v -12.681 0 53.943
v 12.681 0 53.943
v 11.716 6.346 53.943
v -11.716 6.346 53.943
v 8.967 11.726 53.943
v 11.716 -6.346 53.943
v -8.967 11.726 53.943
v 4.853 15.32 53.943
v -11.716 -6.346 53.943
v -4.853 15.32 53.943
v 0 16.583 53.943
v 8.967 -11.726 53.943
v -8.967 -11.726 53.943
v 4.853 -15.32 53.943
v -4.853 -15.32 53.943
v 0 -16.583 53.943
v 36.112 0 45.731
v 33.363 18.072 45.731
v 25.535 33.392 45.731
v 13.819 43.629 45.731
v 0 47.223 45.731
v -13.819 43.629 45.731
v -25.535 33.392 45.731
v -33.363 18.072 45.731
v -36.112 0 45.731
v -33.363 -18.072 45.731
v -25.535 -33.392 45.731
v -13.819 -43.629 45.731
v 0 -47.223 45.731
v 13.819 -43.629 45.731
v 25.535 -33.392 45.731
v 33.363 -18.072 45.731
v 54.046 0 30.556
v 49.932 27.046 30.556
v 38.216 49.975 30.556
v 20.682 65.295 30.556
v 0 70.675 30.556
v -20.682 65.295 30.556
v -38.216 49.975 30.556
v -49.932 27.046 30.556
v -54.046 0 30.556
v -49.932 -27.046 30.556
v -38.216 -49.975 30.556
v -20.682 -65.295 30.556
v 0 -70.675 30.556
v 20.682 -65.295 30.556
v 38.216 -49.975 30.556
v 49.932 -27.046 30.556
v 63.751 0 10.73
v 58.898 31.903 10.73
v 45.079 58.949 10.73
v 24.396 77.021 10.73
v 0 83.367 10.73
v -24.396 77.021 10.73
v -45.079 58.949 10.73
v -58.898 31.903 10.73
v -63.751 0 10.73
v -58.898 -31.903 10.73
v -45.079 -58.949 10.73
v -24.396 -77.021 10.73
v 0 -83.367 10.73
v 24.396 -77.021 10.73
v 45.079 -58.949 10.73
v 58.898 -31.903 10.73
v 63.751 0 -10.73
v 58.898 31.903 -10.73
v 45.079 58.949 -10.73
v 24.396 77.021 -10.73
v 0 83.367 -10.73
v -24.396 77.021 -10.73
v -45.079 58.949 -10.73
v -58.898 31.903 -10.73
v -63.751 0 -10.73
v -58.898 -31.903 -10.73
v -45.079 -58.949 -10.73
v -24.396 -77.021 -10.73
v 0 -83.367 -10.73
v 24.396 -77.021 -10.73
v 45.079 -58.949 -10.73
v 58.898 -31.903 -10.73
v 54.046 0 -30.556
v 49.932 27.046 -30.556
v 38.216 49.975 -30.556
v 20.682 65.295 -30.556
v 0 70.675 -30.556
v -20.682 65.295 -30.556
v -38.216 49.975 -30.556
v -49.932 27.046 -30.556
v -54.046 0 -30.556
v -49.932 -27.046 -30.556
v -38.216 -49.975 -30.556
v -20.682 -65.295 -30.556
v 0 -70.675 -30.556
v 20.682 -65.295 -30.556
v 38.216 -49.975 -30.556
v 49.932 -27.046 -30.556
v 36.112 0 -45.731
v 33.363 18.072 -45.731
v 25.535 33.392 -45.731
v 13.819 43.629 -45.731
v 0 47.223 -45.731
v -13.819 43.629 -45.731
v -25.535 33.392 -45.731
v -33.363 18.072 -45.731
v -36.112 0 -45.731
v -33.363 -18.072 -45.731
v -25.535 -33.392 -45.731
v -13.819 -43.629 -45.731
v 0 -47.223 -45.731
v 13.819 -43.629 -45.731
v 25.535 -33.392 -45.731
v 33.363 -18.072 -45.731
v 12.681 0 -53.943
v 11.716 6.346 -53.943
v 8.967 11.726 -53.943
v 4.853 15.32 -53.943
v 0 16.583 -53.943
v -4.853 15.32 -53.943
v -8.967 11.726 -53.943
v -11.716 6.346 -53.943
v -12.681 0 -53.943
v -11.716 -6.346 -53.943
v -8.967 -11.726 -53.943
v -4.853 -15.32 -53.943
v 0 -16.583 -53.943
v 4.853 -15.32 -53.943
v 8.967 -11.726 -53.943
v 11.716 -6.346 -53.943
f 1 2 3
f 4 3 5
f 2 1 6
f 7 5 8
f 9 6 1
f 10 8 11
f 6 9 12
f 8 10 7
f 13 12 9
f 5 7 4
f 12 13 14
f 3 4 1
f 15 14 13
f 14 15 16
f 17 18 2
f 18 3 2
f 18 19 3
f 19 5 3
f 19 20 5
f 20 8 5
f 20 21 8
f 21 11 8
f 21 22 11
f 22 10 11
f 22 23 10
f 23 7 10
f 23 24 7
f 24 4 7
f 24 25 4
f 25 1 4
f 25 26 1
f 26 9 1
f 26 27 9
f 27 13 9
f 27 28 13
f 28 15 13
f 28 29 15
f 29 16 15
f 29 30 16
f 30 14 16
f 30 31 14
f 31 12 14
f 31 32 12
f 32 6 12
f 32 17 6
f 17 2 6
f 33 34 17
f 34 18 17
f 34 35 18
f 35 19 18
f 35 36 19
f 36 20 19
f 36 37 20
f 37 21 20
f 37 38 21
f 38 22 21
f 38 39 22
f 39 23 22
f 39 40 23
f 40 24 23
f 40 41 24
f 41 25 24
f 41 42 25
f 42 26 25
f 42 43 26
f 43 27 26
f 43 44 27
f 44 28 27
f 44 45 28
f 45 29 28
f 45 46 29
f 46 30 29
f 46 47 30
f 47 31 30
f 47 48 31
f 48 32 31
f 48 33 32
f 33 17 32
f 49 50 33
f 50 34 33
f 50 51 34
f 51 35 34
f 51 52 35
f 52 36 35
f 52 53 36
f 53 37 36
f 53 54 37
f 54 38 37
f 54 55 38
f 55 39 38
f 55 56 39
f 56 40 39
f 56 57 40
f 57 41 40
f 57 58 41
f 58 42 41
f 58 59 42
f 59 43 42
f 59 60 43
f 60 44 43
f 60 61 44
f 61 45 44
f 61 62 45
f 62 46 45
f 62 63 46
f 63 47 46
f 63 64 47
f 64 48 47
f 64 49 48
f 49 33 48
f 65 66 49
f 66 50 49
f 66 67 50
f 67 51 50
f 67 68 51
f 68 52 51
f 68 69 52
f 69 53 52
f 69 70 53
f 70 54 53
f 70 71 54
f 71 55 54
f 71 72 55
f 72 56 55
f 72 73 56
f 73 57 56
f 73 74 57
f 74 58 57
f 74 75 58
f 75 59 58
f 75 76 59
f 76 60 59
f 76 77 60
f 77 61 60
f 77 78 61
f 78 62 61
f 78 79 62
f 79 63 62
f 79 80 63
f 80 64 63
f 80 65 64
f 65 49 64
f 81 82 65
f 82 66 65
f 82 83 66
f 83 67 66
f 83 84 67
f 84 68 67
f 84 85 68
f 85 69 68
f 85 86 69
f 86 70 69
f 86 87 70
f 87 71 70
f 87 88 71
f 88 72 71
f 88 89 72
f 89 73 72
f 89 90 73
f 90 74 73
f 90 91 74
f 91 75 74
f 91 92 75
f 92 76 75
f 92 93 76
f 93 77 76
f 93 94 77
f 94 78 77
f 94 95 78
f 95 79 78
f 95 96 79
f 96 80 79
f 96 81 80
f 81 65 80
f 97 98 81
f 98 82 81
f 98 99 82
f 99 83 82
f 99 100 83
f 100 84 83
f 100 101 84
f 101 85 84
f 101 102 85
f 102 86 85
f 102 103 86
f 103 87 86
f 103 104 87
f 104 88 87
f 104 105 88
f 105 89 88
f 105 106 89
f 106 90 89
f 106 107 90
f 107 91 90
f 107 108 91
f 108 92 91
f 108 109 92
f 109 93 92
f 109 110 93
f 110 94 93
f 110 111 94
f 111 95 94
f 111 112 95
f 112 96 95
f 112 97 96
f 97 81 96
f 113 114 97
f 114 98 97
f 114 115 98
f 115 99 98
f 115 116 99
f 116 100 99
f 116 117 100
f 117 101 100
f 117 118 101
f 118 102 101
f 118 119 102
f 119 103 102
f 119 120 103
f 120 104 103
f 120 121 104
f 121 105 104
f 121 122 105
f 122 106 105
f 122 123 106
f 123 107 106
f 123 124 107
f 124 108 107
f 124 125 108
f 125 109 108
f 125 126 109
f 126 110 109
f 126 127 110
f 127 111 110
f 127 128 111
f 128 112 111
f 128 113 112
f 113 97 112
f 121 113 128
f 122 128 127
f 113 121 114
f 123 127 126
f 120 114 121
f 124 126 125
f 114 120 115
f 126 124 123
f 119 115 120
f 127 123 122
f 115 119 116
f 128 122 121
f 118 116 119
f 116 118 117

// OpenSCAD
// Generated by SolidPython 1.0.1 on 2020-07-29 00:46:51


scale(v = [13, 17, 11]) {
	sphere(r = 5);
}
/***********************************************
*********      SolidPython code:      **********
************************************************
 
# import packages: SolidPython
from solid import *
from solid.utils import *
from itertools import chain, combinations, permutations


class Resize:

    def __init__(self, scad_file):
        self.scad_file = scad_file
        #self.scad_file = import_scad(scad_file)
        # cone/cylinder param:
        self.r1 = 0
        self.r2 = 0
        self.h = 0
        # rectangular prism param:
        self.w = 0
        self.l = 0
        # ellipse param:
        self.r = 0

    # import OpenScad code (file name corresponds to shape)


    # classify shape + parameters
    def assign(self, param1, param2, param3):
        if self.scad_file == 'cone.scad':
            self.r1 = param1
            self.r2 = param2
            self.h = param3
        elif self.scad_file == 'cylinder.scad':
            self.r1 = param1
            self.r2 = param2
            self.h = param3
        elif self.scad_file == 'rectangularPrism.scad':
            self.h = param1
            self.l = param2
            self.w = param3
        else:
            self.r = param1
            self.h = param2

    # resize parameters
    def iterate(self):
        x = range(3, 20, 2)
        i = 1
        if self.scad_file == 'cone.scad':
            tempList = list(permutations(x, 2))
            for temp in tempList:
                param1 = temp[0]
                param2 = temp[1]
                filepath = 'produced_scad_files/' + 'cone' + str(param1) + '_' + str(param2) + '_' + '.scad'
                scad_render_to_file(cylinder(h=param1, r1=param2, r2=0), filepath)

        elif self.scad_file == 'cylinder.scad':
            tempList = list(permutations(x, 3))
            for temp in tempList:
                param1 = temp[0]
                param2 = temp[1]
                filepath = 'produced_scad_files/' + 'cylinder' + str(param1) + '_' + str(param2) + '_' + '.scad'
                scad_render_to_file(cylinder(h=param1, r1=param2, r2=param2), filepath)

        elif self.scad_file == 'rectangularPrism.scad':
            tempList = list(permutations(x, 3))
            for temp in tempList:
                param1 = temp[0]
                param2 = temp[1]
                param3 = temp[2]
                filepath = 'produced_scad_files/' + 'rectangularPrism' + str(param1) + '_' + str(param2) + '_' + str(
                    param3) + '.scad'
                scad_render_to_file(cube(size=(param1, param2, param3)), filepath)

        elif self.scad_file == 'ellipse.scad':
            tempList = list(permutations(x, 4))
            for temp in tempList:
                param1 = temp[0]
                param2 = temp[1]
                param3 = temp[2]
                param4 = temp[3]
                filepath = 'produced_scad_files/' + 'ellipse' + str(param1) + '_' + str(param2) + '_' + str(param3) + '_' + str(param4) + '.scad'
                scad_render_to_file(scale([param1, param2, param3])(sphere(r=param4)), filepath)

    def render_to_scadfile(self):
        scad_render_to_file(scad, 'example.scad') 
 
************************************************/
